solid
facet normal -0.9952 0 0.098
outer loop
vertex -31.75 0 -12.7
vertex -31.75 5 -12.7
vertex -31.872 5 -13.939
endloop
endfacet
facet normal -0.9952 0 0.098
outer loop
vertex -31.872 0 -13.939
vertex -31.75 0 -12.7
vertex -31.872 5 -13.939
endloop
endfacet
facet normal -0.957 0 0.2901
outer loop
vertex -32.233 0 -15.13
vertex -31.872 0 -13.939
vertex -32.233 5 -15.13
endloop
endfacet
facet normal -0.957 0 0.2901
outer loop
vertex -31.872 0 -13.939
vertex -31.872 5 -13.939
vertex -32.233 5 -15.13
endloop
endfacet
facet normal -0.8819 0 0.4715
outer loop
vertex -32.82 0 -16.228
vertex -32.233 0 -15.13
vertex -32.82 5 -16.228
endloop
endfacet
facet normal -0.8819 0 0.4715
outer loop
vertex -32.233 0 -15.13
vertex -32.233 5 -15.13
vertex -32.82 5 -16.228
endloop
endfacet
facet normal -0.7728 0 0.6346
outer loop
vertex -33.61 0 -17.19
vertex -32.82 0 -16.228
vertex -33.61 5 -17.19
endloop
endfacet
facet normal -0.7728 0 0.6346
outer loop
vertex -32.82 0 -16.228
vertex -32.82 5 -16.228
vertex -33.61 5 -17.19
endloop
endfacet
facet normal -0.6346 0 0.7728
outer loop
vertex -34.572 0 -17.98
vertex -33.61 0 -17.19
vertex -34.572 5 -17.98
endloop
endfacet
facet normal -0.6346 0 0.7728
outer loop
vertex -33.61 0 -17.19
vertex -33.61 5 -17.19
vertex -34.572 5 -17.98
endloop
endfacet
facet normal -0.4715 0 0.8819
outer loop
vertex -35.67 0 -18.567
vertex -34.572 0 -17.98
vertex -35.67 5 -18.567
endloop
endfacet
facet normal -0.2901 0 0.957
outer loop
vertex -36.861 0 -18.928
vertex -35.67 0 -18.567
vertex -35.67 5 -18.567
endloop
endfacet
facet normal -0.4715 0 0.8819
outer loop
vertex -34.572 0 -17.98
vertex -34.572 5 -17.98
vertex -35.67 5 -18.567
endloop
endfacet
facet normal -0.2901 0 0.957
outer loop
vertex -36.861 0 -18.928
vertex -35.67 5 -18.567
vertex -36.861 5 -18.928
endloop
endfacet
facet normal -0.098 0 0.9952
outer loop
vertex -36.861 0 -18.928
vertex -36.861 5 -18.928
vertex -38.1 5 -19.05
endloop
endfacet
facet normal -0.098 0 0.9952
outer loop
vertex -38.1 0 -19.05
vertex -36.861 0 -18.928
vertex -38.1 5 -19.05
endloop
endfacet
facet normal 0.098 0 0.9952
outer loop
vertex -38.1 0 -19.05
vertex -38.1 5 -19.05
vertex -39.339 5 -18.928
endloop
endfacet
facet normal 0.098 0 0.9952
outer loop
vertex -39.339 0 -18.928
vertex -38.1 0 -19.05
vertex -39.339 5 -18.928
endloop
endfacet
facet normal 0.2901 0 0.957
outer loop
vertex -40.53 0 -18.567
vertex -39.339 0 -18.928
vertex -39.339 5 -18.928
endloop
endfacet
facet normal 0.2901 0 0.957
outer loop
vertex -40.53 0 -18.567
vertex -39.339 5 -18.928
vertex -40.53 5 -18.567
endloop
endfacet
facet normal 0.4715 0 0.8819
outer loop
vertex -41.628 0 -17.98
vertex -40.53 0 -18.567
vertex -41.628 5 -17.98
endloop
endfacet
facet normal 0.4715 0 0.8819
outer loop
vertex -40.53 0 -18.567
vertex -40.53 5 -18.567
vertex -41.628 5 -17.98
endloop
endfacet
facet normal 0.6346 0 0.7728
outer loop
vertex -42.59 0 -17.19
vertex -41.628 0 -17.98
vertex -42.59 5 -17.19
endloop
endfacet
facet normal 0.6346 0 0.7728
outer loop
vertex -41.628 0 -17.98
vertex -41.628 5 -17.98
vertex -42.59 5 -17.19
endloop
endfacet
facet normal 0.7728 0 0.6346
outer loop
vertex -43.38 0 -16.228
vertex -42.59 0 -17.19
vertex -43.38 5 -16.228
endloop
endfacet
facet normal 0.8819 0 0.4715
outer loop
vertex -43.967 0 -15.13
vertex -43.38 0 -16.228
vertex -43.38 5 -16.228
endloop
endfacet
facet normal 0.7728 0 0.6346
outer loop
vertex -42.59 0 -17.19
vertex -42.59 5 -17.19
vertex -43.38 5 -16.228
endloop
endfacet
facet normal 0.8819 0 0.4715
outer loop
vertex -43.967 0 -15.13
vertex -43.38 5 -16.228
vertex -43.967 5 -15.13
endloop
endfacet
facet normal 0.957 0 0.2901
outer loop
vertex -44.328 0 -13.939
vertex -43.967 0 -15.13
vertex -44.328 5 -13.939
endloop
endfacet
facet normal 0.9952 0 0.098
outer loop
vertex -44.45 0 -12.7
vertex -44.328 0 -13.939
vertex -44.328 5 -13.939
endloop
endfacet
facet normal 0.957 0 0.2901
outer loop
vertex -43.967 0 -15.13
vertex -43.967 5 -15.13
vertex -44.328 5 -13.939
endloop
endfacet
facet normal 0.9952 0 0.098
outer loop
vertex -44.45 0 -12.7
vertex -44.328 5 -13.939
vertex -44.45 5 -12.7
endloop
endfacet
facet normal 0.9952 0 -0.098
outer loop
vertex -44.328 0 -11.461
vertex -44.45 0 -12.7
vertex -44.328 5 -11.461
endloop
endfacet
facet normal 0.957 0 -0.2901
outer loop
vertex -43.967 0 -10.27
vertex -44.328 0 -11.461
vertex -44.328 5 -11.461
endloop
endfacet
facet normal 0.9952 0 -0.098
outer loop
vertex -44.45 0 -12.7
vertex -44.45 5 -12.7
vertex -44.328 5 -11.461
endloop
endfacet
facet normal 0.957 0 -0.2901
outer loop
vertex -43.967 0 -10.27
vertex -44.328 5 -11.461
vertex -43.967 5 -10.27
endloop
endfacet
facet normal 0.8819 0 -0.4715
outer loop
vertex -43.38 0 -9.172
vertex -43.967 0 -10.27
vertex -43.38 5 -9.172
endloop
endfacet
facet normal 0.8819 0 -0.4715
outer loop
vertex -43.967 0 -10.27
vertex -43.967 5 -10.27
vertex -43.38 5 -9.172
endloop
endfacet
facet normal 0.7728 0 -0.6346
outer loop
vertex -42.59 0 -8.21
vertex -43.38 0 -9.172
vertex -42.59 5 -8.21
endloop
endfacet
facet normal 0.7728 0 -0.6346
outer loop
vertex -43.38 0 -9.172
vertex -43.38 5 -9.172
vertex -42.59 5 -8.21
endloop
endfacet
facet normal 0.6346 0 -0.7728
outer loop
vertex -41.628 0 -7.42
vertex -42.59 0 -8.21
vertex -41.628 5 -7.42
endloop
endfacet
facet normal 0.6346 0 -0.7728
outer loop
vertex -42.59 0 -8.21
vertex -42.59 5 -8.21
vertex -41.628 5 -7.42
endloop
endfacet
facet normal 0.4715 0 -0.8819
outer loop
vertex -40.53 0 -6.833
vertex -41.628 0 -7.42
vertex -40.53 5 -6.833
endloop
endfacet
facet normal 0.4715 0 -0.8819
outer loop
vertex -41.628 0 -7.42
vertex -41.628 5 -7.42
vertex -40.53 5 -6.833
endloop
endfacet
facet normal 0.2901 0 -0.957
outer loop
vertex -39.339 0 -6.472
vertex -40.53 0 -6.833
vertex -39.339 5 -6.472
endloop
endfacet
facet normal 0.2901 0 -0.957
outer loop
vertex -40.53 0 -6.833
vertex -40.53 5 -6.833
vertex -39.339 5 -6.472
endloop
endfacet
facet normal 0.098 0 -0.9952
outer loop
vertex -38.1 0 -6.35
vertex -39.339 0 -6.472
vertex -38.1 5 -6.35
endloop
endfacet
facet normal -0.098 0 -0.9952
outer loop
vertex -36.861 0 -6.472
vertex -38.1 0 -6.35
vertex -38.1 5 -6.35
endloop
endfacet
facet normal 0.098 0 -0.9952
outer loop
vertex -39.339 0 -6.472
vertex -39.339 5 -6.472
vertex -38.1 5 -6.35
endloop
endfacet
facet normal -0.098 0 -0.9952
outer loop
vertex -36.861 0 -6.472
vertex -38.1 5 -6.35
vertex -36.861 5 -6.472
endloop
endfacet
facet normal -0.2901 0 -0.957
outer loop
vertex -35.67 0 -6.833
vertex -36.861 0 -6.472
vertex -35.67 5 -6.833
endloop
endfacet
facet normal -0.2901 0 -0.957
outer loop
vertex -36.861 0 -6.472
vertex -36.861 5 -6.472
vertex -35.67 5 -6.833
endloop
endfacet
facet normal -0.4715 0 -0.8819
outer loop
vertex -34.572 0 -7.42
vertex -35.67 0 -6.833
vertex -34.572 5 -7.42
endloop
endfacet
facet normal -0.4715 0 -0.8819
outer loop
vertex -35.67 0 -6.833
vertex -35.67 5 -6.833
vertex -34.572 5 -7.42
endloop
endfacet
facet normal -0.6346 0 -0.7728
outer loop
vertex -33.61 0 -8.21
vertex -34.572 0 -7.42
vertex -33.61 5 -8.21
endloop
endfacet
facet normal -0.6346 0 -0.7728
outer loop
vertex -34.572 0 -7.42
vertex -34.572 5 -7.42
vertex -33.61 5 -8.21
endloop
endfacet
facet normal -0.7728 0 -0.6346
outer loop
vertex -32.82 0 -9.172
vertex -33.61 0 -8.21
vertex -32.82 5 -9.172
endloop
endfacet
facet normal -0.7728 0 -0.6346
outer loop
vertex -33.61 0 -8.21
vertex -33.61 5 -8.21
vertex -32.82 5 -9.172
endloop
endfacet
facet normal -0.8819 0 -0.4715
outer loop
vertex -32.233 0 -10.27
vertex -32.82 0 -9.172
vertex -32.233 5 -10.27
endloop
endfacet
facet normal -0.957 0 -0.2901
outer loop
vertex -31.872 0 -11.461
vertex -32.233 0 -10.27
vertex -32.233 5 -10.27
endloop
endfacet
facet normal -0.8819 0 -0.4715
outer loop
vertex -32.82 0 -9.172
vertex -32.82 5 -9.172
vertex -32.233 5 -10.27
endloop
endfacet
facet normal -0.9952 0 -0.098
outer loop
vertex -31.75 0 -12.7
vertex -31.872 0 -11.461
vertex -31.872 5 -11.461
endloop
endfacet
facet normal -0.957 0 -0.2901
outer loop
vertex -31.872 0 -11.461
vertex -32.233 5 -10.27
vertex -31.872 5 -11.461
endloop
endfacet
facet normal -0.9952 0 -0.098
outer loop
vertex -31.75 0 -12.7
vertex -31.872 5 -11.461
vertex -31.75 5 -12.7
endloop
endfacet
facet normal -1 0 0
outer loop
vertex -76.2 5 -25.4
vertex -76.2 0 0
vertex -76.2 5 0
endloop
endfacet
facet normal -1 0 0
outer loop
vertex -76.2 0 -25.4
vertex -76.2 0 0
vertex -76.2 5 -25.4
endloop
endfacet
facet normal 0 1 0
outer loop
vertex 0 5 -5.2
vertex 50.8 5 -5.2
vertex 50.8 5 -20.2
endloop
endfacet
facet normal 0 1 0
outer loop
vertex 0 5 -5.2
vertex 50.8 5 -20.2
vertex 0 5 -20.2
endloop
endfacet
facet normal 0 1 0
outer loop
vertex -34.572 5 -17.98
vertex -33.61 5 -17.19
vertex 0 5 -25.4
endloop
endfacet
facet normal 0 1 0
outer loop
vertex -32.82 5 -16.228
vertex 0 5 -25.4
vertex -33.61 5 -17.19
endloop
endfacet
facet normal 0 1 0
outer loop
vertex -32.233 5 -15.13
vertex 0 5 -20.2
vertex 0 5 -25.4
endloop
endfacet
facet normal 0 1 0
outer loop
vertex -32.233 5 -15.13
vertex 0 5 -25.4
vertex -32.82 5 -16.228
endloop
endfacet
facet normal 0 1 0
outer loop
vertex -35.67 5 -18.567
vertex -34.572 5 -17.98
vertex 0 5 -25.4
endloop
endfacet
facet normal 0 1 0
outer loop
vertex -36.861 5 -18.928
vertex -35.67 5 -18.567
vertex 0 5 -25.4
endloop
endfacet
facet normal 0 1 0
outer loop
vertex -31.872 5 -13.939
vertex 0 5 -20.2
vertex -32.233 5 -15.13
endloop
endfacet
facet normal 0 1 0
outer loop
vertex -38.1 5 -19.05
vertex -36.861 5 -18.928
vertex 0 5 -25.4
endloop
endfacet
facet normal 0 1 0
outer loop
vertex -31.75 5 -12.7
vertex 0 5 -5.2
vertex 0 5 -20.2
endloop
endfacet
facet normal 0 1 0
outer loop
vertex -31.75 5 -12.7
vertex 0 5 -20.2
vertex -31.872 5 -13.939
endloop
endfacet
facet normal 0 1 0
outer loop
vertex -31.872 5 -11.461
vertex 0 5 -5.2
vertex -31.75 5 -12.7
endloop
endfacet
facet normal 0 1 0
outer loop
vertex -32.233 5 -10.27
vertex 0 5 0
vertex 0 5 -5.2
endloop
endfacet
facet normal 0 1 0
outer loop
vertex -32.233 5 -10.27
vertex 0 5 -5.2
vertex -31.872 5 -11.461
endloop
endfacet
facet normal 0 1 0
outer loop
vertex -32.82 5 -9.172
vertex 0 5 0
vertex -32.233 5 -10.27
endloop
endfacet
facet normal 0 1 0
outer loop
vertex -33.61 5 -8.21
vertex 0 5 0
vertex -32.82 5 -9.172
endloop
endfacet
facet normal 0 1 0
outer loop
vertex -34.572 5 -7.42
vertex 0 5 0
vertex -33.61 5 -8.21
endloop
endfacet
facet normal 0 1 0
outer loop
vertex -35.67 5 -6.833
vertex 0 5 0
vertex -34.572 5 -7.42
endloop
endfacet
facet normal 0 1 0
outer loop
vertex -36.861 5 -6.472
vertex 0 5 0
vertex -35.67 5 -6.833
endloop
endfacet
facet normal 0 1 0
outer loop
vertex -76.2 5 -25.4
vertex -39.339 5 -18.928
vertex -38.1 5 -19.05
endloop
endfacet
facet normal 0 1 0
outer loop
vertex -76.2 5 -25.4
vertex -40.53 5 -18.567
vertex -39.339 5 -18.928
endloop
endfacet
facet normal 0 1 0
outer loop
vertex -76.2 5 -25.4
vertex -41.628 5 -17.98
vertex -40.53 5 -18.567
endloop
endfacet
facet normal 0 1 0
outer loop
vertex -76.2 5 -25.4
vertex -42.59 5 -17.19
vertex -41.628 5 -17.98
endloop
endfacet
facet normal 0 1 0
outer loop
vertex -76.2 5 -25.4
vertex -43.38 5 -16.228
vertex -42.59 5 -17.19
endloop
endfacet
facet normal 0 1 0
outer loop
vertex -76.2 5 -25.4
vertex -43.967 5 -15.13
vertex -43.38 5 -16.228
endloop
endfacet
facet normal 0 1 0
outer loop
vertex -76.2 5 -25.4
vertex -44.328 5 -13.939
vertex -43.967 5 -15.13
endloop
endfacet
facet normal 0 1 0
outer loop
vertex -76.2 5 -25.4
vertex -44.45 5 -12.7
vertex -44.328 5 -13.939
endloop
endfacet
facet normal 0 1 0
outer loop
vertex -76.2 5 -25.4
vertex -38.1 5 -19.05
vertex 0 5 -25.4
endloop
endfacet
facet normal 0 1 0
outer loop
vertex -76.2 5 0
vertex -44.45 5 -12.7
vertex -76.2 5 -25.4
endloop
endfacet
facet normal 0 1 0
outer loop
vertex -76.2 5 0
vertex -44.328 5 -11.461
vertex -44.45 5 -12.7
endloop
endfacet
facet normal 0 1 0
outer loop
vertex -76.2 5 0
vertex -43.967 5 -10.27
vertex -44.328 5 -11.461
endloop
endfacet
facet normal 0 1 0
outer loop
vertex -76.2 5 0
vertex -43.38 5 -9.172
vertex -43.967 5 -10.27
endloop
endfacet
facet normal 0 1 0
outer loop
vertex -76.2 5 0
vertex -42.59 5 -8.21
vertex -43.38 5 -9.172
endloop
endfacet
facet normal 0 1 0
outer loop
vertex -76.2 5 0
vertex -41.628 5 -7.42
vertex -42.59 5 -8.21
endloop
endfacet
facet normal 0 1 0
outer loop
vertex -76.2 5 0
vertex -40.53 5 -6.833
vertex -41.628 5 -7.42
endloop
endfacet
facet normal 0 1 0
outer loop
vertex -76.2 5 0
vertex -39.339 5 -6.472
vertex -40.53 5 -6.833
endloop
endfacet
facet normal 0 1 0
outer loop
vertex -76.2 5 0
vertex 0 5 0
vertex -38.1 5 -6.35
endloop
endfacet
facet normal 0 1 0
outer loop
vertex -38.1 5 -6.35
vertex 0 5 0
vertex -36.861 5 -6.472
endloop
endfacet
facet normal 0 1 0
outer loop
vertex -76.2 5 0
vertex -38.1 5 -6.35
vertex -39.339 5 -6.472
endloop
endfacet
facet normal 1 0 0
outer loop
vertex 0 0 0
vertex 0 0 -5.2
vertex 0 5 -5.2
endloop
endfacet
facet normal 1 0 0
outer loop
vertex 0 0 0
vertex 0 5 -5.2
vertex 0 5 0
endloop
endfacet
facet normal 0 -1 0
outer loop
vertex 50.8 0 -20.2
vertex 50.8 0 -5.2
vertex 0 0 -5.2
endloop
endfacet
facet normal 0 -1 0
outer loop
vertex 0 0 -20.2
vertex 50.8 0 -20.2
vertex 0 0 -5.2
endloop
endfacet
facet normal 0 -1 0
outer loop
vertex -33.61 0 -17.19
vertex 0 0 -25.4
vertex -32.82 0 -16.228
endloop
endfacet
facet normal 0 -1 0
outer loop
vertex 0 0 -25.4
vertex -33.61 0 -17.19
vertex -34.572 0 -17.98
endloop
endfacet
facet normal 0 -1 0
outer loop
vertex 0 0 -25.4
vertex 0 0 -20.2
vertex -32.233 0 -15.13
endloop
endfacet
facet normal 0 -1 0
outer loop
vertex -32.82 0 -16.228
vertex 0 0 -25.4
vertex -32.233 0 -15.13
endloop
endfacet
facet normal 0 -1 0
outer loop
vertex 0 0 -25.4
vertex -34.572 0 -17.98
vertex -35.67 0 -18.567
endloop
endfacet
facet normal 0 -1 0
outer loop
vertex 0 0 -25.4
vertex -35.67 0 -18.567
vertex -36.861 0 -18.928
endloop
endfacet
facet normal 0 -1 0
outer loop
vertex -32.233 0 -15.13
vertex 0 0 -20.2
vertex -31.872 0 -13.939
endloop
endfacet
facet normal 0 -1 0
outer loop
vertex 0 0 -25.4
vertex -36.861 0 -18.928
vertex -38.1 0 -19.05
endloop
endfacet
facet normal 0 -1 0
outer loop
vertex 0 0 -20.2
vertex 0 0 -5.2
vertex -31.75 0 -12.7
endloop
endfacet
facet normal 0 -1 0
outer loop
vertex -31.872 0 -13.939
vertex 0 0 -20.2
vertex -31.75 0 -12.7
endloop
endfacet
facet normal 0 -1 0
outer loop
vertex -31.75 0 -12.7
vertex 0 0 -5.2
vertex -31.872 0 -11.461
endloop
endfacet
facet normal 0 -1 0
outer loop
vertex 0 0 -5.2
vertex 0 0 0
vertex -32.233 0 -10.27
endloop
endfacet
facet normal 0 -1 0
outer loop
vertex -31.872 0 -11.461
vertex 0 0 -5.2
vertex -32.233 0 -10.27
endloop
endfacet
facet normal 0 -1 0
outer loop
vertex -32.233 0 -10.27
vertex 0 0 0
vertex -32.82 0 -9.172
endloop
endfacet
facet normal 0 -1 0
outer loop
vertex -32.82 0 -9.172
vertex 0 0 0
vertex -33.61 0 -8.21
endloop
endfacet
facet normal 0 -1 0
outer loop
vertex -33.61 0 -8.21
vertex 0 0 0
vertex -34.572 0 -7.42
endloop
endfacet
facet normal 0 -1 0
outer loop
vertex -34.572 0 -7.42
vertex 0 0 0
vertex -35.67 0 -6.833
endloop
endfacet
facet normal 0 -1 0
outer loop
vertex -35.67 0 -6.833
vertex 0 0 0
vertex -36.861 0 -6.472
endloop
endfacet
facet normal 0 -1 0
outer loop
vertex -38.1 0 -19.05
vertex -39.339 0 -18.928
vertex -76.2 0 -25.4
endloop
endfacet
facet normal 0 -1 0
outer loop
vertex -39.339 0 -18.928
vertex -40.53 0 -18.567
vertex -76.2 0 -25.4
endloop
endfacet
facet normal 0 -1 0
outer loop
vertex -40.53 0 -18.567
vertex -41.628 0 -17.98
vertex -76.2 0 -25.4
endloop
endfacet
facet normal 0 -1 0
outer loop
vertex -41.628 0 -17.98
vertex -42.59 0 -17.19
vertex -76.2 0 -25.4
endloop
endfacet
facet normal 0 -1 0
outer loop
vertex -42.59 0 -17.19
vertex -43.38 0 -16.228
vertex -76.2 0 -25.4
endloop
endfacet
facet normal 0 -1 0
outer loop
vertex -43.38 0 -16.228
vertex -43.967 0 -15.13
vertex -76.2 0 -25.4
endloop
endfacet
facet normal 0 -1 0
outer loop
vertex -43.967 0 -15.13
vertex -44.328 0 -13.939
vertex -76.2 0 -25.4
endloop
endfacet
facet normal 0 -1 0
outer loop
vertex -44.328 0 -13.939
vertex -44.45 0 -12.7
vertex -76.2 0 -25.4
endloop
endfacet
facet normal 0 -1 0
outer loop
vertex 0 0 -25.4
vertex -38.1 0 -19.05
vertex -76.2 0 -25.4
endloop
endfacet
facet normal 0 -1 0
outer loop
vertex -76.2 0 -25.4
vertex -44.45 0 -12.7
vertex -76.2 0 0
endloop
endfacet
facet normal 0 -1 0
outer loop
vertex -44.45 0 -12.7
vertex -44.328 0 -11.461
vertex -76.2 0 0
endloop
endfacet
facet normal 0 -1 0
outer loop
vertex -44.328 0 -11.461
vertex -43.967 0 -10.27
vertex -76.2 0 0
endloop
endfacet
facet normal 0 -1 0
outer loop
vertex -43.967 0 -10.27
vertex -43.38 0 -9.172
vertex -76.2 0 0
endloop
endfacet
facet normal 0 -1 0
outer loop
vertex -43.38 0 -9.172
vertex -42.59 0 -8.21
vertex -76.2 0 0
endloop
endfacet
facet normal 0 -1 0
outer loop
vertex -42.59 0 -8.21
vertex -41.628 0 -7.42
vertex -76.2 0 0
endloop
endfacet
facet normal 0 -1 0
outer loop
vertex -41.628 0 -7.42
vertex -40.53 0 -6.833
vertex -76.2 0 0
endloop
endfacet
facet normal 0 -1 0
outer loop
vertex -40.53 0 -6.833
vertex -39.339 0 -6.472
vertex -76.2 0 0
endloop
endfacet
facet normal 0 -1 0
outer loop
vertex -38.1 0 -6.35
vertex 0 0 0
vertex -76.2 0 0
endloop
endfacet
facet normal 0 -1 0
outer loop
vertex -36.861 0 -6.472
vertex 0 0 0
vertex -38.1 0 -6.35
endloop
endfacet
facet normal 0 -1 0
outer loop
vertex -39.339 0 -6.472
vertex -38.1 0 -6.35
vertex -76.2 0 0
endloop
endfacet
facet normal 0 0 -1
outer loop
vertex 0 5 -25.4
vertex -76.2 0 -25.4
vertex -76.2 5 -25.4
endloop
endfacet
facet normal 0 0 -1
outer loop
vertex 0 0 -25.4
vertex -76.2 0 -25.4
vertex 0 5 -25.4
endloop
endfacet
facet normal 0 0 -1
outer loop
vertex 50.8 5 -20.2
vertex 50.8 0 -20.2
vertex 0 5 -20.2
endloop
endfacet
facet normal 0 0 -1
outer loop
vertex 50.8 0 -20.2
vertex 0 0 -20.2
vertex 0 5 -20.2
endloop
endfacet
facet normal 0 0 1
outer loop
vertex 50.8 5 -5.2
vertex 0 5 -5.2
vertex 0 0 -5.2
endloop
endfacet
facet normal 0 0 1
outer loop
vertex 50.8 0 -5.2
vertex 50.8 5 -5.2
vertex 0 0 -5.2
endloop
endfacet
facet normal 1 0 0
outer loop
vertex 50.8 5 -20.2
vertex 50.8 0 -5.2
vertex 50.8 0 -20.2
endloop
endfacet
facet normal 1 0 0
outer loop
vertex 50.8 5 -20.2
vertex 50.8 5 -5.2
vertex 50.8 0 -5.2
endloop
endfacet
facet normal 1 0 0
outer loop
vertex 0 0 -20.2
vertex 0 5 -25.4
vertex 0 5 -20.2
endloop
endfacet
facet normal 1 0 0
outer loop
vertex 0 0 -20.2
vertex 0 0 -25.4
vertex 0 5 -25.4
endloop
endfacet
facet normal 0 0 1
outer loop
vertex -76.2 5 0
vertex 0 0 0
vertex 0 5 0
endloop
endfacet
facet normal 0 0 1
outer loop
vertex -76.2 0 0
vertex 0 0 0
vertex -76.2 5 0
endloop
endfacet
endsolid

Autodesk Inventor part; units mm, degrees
ref_plane "YZ Plane" through (0, 0, 0) normal (1, 0, 0) x (0, 1, 0)
ref_plane "XZ Plane" through (0, 0, 0) normal (0, 1, 0) x (-1, 0, 0)
ref_plane "XY Plane" through (0, 0, 0) normal (0, 0, 1) x (1, 0, 0)
sketch "Sketch1" plane through (0, 0, 0) normal (0, 1, 0) x (-1, 0, 0)
  line L0 (0, 0) -> (76.2, 0)
  line L1 (76.2, 0) -> (76.2, -25.4)
  line L2 (76.2, -25.4) -> (0, -25.4)
  line L3 (0, -25.4) -> (0, 0)
  dimension "d0" = 25.4
  dimension "d1" = 76.2
extrude "Extrusion1" add sketch "Sketch1" along normal blind 5
sketch "Sketch2" plane through (0, 0, 0) normal (1, 0, 0) x (0, 0, -1)
  line L0 (25.4, 0) -> (0, 0) projected
  line L1 (25.4, 0) -> (25.4, 5) projected
  line L2 (0, 5) -> (25.4, 5) projected
  line L3 (0, 0) -> (0, 5) projected
  line L4 (5.2, 0) -> (20.2, 0)
  line L5 (20.2, 0) -> (20.2, 5)
  line L6 (20.2, 5) -> (5.2, 5)
  line L7 (5.2, 5) -> (5.2, 0)
  dimension "d4" = 15
  dimension "d5" = 25.4
  dimension "d6" = 5.2
extrude "Extrusion2" add sketch "Sketch2" along normal blind 50.8 contours L0 L7 L2 L5
sketch "Sketch4" plane through (0, 5, 0) normal (0, 1, 0) x (1, 0, 0)
  circle A0 centre (-38.1, 12.7) radius 6.35
  line L0 (0, 20.2) -> (0, 25.4) projected
  line L1 (-76.2, 0) -> (0, 0) projected
  dimension "d12" = 12.7
  dimension "d13" = 38.1
  dimension "d14" = 12.7
extrude "Extrusion4" cut sketch "Sketch4" against normal blind 50.8
equation "\"d6\" = -0.5 * d4 + 0.5 * d5"
properties part number "TSV+In" material "Steel"
